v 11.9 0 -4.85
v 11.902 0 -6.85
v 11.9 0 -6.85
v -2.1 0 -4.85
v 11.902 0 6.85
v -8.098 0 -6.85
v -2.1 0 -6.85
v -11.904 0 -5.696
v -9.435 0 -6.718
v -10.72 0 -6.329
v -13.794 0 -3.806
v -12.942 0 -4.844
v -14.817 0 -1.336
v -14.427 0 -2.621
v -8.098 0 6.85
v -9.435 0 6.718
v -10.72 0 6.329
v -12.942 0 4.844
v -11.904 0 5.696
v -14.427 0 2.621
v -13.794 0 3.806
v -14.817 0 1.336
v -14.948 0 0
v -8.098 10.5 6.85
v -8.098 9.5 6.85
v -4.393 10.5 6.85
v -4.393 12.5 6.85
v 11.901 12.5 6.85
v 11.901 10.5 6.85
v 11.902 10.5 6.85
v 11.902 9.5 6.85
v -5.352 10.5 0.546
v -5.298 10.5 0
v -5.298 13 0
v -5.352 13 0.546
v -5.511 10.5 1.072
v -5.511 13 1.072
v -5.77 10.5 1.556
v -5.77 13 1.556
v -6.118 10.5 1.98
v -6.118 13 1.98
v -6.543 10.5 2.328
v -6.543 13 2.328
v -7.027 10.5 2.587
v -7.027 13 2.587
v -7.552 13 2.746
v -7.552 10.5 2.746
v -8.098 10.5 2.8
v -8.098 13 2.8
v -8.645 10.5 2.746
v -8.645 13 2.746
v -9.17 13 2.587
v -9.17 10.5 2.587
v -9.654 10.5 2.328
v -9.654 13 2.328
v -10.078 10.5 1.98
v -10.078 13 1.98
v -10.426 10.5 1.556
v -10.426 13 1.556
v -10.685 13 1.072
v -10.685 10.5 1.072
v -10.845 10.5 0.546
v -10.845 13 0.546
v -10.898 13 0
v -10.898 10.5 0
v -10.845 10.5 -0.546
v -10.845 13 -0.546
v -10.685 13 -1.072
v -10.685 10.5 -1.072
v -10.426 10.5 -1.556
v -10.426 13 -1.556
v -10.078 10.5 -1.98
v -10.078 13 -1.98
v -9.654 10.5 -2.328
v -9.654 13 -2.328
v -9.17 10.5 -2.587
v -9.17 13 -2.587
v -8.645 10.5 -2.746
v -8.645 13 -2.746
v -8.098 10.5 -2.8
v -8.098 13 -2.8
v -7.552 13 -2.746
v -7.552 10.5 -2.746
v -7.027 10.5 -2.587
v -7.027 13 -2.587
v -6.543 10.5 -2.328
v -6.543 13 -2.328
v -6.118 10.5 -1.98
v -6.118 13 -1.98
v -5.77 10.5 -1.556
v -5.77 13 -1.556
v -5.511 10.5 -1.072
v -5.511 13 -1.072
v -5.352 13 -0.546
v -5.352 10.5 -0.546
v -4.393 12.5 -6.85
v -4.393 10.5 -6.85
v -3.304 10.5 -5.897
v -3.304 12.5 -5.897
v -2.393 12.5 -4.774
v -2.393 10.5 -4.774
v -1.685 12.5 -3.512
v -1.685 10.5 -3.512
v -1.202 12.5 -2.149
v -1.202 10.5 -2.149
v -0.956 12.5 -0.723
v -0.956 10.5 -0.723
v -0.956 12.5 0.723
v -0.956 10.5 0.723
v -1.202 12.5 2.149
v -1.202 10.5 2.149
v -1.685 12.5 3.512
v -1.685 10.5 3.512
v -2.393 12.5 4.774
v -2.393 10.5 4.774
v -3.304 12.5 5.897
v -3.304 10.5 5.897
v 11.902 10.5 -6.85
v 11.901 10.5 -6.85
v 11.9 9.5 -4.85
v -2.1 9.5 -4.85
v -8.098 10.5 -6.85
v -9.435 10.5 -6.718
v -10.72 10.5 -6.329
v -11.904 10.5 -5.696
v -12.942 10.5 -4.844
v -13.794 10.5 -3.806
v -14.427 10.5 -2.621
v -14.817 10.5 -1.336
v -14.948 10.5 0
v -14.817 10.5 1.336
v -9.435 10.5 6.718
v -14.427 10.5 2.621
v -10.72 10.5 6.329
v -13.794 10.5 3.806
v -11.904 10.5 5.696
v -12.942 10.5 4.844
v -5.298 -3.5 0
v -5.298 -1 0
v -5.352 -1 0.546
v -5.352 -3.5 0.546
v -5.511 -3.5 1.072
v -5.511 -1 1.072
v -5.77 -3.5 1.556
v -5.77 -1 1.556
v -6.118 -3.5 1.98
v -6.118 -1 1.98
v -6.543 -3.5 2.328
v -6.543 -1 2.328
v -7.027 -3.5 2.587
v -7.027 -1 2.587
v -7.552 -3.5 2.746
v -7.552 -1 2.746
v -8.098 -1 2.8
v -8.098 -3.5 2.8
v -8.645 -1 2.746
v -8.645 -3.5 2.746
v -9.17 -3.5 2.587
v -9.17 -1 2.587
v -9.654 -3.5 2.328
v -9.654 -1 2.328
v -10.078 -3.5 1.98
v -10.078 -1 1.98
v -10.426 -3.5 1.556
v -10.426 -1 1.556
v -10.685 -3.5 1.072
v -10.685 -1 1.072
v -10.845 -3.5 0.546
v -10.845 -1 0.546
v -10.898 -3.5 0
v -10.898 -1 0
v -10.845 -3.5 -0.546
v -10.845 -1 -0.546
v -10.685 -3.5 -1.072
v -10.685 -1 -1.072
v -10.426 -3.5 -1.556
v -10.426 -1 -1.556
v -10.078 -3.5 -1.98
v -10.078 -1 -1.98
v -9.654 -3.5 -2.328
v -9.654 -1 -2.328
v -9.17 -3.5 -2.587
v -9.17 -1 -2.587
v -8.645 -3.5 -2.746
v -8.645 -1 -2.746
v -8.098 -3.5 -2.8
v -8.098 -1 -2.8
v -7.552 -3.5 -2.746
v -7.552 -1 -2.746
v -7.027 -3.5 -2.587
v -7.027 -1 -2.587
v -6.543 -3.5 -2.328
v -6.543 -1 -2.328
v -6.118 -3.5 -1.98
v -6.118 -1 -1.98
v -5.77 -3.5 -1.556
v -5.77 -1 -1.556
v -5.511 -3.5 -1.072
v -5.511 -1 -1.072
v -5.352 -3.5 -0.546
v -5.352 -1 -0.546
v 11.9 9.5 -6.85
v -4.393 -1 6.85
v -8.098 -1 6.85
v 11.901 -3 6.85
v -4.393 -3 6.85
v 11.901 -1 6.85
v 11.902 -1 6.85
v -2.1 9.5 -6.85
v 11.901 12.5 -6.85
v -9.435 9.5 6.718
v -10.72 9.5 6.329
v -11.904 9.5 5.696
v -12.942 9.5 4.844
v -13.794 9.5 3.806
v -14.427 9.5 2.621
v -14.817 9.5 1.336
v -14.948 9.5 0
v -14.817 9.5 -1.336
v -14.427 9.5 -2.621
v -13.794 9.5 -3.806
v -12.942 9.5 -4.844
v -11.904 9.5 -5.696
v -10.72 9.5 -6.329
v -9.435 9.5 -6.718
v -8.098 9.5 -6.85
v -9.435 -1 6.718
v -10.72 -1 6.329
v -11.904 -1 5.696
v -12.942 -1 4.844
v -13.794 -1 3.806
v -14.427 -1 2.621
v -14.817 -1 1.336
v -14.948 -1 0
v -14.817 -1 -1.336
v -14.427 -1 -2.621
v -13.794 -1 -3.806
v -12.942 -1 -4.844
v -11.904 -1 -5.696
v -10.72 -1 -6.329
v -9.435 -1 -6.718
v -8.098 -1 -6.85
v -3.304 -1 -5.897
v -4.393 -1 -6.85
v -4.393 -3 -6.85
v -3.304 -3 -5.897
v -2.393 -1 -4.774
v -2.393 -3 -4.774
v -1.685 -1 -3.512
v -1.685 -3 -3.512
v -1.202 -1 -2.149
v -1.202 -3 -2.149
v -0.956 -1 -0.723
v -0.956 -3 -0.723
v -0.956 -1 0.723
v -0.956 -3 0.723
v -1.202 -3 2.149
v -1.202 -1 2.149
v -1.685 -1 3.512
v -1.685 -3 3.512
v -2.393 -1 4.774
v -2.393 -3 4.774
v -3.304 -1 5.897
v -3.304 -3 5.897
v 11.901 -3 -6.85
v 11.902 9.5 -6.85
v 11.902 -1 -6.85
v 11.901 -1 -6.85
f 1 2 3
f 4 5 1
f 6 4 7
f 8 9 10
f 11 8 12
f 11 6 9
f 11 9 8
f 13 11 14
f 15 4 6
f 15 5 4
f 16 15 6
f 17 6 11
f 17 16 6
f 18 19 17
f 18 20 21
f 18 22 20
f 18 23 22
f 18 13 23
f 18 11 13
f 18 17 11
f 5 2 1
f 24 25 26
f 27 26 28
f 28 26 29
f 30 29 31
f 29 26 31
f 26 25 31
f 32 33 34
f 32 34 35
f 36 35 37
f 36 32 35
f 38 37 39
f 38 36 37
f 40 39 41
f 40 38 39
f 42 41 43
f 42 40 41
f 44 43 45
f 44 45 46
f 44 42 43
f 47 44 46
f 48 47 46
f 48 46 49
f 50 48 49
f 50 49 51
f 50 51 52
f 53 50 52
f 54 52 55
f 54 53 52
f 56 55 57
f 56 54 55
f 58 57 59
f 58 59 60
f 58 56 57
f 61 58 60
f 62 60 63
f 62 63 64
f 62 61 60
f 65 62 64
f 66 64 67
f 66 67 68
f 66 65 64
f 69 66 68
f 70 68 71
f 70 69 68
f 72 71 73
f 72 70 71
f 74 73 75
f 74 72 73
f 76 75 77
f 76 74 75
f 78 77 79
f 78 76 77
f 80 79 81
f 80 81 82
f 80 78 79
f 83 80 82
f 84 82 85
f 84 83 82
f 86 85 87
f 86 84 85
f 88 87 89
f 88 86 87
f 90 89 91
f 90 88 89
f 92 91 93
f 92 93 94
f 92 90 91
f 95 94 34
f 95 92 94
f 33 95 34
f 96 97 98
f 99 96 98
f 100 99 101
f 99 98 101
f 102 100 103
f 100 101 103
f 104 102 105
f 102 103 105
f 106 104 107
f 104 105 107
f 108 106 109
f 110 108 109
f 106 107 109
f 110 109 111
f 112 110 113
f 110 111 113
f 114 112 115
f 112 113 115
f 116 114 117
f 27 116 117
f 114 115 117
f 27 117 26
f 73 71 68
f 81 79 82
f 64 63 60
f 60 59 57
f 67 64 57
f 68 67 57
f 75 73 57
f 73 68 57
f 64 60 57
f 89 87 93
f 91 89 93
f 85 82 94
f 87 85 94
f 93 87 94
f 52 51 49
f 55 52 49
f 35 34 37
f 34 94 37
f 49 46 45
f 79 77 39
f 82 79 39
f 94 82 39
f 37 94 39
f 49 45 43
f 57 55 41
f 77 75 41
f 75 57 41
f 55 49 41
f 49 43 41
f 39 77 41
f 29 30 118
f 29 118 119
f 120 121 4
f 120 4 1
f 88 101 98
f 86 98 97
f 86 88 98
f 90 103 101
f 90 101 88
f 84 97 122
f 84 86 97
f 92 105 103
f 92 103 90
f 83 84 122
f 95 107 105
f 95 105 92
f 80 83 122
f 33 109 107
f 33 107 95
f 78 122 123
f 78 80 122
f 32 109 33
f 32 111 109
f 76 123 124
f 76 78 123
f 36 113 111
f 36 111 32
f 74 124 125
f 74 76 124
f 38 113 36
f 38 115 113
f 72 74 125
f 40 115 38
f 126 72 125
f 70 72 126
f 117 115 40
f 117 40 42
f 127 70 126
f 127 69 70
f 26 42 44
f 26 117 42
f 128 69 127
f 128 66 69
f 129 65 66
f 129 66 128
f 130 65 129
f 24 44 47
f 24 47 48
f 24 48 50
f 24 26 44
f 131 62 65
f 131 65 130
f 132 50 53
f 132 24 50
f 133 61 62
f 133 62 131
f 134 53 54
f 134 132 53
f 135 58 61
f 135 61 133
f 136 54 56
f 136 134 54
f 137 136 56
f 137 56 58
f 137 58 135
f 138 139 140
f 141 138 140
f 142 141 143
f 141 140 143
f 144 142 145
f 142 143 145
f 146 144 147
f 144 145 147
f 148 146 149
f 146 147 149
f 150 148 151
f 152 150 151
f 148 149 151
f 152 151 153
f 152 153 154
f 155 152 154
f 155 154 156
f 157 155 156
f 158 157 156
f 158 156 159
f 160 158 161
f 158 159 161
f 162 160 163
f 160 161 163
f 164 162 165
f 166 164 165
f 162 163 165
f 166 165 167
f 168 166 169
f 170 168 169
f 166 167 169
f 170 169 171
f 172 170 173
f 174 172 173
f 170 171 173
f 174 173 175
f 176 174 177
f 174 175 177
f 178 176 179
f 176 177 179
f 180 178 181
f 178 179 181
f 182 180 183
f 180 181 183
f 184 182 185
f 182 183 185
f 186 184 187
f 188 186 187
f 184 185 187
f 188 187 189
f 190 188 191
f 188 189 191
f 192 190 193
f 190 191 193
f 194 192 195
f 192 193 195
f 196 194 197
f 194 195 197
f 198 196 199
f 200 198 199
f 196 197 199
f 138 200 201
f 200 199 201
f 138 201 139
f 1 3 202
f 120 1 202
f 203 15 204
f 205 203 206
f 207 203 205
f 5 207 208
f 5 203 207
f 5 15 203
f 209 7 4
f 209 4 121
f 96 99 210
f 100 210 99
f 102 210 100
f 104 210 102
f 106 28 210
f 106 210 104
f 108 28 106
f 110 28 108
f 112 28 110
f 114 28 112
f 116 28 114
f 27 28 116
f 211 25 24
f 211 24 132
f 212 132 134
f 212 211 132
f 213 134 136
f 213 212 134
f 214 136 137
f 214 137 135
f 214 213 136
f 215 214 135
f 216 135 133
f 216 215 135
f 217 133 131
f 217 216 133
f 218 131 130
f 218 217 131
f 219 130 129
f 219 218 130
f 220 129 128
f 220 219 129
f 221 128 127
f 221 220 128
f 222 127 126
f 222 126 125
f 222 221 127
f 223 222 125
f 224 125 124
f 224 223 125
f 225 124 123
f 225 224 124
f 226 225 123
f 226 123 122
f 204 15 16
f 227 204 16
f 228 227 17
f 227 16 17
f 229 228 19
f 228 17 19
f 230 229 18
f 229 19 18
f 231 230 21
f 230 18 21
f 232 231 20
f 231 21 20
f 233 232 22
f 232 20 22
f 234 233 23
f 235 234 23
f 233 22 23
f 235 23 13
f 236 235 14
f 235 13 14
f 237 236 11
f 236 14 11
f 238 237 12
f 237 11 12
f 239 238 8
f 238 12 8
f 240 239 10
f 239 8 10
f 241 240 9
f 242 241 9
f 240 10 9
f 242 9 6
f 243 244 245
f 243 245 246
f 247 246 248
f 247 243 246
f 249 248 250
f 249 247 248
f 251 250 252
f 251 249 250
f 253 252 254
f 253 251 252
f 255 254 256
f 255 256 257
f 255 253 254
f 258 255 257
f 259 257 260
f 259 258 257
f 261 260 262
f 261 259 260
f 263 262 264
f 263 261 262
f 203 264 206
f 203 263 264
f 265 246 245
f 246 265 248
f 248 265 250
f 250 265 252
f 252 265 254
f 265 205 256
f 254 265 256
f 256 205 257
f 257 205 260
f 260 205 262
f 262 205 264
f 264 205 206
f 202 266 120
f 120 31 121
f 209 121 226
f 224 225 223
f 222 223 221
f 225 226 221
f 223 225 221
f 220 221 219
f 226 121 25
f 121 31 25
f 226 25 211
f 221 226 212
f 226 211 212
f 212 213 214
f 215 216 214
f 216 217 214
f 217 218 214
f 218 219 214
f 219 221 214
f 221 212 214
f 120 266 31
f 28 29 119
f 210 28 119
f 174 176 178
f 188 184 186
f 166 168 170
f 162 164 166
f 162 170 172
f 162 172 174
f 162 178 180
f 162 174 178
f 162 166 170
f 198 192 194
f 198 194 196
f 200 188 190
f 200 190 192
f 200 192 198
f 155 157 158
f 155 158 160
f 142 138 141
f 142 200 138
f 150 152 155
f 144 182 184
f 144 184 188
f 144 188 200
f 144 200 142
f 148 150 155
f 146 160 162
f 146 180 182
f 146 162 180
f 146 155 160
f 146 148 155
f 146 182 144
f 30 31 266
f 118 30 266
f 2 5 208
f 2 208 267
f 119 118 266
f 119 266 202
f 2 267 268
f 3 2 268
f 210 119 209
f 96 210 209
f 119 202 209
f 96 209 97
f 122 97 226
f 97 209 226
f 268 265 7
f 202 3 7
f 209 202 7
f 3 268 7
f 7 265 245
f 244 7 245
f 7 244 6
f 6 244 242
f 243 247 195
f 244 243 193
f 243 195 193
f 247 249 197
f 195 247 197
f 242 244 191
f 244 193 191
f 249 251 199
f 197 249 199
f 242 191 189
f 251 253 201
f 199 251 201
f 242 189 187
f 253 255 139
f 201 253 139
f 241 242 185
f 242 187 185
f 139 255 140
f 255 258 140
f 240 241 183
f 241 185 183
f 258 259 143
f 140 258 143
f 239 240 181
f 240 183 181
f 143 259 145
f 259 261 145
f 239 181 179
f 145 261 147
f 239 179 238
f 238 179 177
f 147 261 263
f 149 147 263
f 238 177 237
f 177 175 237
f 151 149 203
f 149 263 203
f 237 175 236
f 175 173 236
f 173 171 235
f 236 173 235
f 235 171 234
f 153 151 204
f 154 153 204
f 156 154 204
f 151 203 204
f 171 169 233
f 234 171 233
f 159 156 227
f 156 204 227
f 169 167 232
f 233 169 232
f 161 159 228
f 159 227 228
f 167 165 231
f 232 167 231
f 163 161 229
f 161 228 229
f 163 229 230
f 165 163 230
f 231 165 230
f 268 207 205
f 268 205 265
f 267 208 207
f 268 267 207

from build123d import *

# Parameters (mm, degrees)
PAD_DEPTH    = 1
SKETCH001_R  = 2.8
PAD001_DEPTH = 2.5
PAD002_DEPTH = 2
BOX_W        = 14
BOX_H        = 15.5
BOX_DEPTH    = 2


with BuildPart() as pad002:
    # Sketch → Pad (new body)
    with BuildSketch(Plane.XZ):
        with BuildLine():
            Line((-8.098338, 6.85), (11.901662, 6.85))
            Line((11.901662, 6.85), (11.901662, -6.85))
            Line((11.901662, -6.85), (-8.098338, -6.85))
            ThreePointArc((-8.098338, 6.85), (-14.94833, 0), (-8.098338, -6.85))
        make_face()
    extrude(amount=PAD_DEPTH)

    # Sketch001 → Pad001 (new body)
    with BuildSketch(Plane.XZ.offset(1)):
        with Locations((-8.09833, 0)):
            Circle(SKETCH001_R)
    extrude(amount=PAD001_DEPTH)

    # Sketch002 → Pad002 (new body)
    with BuildSketch(Plane.XZ.offset(1)):
        with BuildLine():
            Line((-4.392837, 6.85), (11.900914, 6.85))
            Line((11.900914, 6.85), (11.900914, -6.85))
            Line((11.900914, -6.85), (-4.392837, -6.85))
            ThreePointArc((-4.392837, -6.85), (-0.92548, 0), (-4.392837, 6.85))
        make_face()
    extrude(amount=PAD002_DEPTH)


with BuildPart() as part_mirroring:
    # Part__Mirroring: instance of Pad002
    add(pad002.part.mirror(Plane(origin=(0, 4.75, 0), x_dir=(1, 0, 0), z_dir=(0, 1, 0))))


with BuildPart() as fusion:
    # Box → Box (new body)
    with BuildSketch(Plane(origin=(-2.1, -3, -6.85), x_dir=(1, 0, 0), z_dir=(0, 0, 1))):
        with Locations((7, 7.75)):
            Rectangle(BOX_W, BOX_H)
    extrude(amount=BOX_DEPTH)

    # Fusion: union Pad002, Part__Mirroring
    add(pad002.part)
    add(part_mirroring.part)


solid = fusion.part
